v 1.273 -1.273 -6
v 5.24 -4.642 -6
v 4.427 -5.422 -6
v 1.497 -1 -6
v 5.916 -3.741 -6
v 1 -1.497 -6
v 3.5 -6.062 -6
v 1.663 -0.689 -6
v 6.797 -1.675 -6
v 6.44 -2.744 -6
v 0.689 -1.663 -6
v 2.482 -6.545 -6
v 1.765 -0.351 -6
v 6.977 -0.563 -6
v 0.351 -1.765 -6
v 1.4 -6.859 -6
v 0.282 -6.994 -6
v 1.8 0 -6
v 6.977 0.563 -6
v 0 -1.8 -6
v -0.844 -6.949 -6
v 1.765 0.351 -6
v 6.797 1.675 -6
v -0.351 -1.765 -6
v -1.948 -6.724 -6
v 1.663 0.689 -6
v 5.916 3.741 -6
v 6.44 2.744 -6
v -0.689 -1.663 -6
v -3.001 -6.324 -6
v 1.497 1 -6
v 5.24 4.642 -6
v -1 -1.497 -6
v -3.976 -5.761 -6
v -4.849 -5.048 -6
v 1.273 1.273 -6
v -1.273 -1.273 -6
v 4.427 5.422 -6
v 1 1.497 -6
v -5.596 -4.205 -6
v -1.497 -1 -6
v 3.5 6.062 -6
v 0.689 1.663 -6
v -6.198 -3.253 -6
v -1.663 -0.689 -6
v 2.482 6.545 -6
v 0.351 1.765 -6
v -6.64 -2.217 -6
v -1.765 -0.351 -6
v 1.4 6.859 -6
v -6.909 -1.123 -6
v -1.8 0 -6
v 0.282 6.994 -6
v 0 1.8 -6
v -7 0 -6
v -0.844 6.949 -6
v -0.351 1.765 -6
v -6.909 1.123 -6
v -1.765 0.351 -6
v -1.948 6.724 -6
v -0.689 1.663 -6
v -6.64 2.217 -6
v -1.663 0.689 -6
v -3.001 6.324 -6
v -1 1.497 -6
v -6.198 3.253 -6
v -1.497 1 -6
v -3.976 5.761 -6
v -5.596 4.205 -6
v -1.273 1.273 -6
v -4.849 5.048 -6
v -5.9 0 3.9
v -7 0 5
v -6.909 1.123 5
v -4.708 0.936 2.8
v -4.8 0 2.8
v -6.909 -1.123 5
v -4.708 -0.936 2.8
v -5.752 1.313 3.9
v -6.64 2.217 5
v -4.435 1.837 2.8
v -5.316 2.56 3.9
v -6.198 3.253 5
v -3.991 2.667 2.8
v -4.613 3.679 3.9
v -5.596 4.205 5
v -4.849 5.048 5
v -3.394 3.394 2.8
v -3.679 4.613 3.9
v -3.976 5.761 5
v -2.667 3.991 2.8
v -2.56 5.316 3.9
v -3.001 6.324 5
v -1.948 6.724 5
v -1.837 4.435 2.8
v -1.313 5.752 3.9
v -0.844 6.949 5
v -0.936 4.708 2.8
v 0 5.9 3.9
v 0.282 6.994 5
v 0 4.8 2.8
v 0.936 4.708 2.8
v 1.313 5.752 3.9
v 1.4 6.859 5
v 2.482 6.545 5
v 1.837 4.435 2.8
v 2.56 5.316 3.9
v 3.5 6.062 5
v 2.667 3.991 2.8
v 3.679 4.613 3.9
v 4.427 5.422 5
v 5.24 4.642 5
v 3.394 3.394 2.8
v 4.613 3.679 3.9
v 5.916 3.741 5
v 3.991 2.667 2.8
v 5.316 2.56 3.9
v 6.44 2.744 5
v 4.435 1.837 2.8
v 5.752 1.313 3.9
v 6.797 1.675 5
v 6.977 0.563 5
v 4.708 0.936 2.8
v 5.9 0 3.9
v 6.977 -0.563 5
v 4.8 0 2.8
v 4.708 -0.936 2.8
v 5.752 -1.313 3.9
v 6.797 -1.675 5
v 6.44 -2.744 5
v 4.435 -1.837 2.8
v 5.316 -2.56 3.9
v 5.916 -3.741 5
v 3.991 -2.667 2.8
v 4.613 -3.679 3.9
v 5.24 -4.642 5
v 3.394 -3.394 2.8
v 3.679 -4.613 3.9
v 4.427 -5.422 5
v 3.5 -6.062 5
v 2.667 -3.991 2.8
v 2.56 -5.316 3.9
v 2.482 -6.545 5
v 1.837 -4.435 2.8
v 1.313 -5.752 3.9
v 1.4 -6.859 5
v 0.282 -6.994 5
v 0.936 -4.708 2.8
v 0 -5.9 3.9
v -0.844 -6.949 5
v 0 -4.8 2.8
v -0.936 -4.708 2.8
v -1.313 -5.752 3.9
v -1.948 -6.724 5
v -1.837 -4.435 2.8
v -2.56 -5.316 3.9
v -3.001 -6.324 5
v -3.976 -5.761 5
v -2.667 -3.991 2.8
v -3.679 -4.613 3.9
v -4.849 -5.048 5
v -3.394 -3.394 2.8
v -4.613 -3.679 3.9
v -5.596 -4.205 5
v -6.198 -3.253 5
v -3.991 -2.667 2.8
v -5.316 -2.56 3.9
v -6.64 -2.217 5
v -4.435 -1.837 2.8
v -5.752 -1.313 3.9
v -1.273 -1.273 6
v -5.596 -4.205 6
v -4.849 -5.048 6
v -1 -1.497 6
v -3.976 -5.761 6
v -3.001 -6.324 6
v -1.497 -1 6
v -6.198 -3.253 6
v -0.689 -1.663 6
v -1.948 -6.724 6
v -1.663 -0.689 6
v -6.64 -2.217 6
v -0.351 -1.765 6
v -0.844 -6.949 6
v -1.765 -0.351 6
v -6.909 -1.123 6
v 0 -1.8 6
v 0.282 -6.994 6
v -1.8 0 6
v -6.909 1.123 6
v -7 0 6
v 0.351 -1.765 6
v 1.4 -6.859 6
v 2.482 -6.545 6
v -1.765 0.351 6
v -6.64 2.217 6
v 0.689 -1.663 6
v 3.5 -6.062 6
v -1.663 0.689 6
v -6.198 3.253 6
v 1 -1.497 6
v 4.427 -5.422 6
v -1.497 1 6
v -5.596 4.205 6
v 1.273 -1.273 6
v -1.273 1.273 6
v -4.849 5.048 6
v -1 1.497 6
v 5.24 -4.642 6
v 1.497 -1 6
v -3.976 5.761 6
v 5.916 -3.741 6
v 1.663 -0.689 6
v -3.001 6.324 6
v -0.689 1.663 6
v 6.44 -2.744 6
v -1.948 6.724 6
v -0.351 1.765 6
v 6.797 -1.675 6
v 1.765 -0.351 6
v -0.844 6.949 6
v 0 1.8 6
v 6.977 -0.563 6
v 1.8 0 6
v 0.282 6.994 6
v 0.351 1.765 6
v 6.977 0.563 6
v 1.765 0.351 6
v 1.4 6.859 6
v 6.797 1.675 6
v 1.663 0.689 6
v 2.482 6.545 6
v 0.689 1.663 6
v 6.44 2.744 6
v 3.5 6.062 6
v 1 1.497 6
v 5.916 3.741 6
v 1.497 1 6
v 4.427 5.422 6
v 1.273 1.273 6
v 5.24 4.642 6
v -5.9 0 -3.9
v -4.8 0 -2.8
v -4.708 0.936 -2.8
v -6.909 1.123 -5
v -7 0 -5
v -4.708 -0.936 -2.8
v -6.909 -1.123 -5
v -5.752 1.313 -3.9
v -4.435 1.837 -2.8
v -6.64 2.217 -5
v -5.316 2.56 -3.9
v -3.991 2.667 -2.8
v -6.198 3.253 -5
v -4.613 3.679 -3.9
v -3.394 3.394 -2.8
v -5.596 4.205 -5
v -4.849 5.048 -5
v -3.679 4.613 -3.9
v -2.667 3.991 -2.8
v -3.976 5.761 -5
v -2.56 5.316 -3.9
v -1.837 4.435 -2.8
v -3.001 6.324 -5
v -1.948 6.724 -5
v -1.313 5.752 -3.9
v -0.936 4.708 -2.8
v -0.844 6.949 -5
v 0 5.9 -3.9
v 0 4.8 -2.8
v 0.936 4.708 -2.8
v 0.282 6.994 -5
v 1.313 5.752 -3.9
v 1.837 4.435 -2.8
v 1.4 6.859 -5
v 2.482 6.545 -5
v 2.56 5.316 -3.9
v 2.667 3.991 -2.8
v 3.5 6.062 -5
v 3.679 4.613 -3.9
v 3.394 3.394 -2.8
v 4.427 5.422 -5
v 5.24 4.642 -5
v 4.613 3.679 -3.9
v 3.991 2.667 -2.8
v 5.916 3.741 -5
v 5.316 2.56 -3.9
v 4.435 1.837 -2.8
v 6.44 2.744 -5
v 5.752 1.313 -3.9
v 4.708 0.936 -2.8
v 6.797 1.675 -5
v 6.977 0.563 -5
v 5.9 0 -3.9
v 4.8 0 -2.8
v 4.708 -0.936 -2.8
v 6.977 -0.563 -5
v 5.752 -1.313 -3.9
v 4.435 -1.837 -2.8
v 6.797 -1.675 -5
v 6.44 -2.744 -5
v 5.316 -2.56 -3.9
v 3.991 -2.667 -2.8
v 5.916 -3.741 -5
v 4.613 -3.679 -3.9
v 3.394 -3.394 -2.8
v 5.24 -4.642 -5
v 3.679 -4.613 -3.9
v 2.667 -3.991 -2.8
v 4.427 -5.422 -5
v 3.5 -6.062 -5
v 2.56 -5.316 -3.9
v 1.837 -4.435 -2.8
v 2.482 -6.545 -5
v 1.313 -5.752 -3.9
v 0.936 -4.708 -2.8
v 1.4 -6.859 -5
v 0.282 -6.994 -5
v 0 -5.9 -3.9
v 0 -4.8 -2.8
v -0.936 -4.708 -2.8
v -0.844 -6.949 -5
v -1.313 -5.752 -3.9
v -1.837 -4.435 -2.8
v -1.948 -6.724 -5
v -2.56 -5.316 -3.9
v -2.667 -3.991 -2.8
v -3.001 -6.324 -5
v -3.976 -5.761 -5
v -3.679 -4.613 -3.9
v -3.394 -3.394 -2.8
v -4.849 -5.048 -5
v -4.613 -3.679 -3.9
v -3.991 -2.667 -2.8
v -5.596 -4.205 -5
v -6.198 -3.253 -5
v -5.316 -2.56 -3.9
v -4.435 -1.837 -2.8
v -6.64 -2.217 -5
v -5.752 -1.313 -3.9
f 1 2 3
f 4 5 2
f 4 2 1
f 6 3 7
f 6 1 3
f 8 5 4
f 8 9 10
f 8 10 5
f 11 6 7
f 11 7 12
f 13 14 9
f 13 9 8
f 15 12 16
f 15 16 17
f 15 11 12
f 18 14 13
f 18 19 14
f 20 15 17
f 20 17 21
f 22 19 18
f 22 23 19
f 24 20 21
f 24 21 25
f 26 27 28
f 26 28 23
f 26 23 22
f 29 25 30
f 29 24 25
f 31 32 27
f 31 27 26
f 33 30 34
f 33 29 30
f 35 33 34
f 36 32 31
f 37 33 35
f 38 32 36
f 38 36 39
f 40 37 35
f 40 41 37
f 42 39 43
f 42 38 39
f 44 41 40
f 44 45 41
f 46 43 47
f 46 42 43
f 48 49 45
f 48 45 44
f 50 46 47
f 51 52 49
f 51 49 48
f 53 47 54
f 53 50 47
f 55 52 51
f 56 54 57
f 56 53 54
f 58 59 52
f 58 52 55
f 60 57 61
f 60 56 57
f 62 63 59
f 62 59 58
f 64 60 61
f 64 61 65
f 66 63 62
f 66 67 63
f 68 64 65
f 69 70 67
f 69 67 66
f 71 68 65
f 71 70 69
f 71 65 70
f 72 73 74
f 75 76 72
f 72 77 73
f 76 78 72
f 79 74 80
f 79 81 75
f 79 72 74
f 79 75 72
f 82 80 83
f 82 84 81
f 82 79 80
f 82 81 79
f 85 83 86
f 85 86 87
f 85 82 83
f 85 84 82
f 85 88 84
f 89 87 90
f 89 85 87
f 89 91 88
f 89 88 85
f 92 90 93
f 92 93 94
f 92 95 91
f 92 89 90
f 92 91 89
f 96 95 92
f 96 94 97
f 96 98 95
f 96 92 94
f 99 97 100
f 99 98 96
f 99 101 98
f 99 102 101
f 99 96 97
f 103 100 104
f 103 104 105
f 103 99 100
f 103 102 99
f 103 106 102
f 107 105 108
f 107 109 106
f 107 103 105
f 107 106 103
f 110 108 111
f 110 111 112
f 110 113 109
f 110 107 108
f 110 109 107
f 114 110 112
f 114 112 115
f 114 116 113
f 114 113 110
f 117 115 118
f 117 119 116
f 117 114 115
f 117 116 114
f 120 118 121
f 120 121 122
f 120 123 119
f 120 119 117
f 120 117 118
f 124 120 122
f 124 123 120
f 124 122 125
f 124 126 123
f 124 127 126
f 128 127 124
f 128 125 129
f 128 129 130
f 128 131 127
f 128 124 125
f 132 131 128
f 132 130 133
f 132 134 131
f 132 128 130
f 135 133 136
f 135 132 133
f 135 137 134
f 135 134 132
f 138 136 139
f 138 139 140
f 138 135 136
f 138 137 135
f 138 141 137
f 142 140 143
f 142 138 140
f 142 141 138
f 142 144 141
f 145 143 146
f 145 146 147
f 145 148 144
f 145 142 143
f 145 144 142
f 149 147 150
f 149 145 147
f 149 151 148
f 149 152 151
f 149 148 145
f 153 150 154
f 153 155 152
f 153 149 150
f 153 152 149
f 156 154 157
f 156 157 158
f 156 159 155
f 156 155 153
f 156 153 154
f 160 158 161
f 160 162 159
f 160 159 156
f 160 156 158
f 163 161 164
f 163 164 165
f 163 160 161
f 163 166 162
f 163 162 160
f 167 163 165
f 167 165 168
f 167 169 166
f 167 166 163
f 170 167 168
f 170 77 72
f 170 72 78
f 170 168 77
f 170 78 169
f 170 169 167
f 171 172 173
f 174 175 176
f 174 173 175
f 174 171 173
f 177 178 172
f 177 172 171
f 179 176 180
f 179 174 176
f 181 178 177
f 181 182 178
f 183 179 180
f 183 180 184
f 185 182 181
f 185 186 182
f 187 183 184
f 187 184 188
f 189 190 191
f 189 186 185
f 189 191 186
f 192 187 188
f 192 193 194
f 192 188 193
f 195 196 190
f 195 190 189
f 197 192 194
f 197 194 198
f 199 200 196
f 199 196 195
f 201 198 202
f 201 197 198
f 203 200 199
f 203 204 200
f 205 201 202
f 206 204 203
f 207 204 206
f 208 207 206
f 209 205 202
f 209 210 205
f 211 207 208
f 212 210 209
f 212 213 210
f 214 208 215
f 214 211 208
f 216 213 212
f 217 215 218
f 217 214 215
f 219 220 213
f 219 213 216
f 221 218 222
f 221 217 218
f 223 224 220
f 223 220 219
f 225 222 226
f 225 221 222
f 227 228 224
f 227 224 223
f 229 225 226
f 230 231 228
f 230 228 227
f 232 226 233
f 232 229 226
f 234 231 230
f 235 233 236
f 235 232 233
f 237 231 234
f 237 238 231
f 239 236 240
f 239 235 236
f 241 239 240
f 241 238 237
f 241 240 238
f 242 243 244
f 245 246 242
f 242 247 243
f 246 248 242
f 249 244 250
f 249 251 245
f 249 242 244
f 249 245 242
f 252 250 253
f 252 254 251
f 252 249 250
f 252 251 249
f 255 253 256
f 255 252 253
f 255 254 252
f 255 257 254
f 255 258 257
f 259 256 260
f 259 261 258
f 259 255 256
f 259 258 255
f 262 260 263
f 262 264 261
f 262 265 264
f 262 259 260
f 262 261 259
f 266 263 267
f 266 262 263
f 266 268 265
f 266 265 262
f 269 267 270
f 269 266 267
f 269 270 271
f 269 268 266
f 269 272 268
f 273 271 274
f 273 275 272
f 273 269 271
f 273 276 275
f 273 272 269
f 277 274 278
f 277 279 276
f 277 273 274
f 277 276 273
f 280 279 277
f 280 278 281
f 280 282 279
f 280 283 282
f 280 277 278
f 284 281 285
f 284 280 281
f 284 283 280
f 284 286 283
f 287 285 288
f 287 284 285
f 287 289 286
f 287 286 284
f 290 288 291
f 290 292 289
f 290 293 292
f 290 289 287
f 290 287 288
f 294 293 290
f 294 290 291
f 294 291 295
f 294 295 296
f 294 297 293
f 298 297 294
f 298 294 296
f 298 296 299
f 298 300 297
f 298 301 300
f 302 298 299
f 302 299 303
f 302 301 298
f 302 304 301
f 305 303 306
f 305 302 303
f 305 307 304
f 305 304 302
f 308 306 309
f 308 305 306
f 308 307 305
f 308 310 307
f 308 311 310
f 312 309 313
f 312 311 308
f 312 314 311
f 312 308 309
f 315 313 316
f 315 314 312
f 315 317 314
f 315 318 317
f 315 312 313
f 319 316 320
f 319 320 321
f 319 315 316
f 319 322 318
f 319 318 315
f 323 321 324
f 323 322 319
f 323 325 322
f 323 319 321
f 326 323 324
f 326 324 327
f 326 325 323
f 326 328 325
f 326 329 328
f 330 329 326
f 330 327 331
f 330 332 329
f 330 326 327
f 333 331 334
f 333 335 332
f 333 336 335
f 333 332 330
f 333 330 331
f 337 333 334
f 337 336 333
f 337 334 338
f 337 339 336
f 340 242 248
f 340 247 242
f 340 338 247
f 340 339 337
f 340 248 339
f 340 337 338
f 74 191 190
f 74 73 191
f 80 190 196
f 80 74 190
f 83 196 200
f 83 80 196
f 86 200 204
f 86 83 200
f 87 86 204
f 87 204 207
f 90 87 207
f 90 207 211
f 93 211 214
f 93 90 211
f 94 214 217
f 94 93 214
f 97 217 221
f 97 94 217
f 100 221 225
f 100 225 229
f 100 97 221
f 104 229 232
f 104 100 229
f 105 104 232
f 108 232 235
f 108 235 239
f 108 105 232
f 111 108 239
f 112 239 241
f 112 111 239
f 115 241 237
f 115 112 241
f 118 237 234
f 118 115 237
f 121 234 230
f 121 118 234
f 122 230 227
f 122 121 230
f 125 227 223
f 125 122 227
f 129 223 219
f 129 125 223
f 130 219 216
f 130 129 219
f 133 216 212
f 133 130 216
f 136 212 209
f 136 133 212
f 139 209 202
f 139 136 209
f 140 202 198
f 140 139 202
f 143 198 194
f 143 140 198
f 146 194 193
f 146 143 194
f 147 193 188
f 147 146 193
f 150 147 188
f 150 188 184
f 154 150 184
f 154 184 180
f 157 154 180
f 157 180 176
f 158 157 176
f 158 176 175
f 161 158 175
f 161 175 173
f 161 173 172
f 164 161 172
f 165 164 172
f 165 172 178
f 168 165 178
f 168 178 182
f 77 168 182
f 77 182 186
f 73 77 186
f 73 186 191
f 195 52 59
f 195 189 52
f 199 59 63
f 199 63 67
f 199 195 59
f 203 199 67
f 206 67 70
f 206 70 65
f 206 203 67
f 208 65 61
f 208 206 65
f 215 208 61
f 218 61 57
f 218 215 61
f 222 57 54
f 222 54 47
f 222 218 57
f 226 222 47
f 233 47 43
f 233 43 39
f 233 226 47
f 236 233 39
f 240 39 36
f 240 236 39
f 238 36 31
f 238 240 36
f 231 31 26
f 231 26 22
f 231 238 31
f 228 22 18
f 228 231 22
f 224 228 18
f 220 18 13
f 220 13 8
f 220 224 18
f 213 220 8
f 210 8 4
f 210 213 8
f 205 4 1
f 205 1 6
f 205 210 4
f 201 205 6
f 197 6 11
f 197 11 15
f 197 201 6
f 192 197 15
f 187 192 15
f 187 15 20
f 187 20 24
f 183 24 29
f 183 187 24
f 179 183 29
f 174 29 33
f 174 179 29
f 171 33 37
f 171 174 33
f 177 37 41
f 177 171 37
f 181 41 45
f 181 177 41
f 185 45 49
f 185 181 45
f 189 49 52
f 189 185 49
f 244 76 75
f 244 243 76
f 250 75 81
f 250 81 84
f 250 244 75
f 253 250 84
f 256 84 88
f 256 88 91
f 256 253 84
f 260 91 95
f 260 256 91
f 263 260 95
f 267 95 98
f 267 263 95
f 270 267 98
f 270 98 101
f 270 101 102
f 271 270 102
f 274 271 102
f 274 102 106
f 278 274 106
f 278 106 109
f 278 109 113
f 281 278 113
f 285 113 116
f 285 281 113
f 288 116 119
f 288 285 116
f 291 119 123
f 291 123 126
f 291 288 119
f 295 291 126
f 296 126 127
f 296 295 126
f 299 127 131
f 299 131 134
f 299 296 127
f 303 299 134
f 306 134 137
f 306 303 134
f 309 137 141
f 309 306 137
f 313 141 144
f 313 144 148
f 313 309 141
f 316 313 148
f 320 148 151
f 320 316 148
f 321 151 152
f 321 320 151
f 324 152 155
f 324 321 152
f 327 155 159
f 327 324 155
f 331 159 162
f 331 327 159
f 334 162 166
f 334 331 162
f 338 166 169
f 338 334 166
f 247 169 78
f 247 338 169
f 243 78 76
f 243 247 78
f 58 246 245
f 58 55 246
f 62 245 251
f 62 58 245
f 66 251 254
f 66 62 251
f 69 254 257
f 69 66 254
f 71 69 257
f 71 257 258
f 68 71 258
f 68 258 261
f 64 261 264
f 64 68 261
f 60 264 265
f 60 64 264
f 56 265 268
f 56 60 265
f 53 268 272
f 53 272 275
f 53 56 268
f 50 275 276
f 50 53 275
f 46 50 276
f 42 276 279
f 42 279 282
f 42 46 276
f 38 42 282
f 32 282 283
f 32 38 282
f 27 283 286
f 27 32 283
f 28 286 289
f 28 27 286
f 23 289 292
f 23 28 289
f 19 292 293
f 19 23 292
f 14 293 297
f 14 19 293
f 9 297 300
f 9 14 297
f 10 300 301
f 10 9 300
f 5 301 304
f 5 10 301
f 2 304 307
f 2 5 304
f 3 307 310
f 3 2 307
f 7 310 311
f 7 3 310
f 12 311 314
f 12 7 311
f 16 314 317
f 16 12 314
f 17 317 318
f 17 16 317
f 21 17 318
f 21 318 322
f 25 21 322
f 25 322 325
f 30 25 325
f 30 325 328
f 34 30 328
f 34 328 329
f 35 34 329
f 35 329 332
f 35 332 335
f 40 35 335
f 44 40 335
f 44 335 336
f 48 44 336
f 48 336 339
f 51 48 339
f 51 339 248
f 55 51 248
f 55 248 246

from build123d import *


with BuildPart() as f1:
    # F0 (on Front) → F1 (revolve)
    with BuildSketch(Plane.XZ):
        Polygon((-1.8, -6), (-1.8, 0), (-4.8, 0), (-4.8, -2.8), (-4.8, -6), align=None)
        Polygon((-4.8, 2.8), (-4.8, 6), (-7, 6), (-7, 5), align=None)
        Polygon((-1.8, 6), (-4.8, 6), (-4.8, 2.8), (-4.8, 0), (-1.8, 0), align=None)
        Polygon((-4.8, -6), (-4.8, -2.8), (-7, -5), (-7, -6), align=None)
    revolve(axis=Axis((0, 0, -0.768788), (0, 0, -1)))


solid = f1.part
